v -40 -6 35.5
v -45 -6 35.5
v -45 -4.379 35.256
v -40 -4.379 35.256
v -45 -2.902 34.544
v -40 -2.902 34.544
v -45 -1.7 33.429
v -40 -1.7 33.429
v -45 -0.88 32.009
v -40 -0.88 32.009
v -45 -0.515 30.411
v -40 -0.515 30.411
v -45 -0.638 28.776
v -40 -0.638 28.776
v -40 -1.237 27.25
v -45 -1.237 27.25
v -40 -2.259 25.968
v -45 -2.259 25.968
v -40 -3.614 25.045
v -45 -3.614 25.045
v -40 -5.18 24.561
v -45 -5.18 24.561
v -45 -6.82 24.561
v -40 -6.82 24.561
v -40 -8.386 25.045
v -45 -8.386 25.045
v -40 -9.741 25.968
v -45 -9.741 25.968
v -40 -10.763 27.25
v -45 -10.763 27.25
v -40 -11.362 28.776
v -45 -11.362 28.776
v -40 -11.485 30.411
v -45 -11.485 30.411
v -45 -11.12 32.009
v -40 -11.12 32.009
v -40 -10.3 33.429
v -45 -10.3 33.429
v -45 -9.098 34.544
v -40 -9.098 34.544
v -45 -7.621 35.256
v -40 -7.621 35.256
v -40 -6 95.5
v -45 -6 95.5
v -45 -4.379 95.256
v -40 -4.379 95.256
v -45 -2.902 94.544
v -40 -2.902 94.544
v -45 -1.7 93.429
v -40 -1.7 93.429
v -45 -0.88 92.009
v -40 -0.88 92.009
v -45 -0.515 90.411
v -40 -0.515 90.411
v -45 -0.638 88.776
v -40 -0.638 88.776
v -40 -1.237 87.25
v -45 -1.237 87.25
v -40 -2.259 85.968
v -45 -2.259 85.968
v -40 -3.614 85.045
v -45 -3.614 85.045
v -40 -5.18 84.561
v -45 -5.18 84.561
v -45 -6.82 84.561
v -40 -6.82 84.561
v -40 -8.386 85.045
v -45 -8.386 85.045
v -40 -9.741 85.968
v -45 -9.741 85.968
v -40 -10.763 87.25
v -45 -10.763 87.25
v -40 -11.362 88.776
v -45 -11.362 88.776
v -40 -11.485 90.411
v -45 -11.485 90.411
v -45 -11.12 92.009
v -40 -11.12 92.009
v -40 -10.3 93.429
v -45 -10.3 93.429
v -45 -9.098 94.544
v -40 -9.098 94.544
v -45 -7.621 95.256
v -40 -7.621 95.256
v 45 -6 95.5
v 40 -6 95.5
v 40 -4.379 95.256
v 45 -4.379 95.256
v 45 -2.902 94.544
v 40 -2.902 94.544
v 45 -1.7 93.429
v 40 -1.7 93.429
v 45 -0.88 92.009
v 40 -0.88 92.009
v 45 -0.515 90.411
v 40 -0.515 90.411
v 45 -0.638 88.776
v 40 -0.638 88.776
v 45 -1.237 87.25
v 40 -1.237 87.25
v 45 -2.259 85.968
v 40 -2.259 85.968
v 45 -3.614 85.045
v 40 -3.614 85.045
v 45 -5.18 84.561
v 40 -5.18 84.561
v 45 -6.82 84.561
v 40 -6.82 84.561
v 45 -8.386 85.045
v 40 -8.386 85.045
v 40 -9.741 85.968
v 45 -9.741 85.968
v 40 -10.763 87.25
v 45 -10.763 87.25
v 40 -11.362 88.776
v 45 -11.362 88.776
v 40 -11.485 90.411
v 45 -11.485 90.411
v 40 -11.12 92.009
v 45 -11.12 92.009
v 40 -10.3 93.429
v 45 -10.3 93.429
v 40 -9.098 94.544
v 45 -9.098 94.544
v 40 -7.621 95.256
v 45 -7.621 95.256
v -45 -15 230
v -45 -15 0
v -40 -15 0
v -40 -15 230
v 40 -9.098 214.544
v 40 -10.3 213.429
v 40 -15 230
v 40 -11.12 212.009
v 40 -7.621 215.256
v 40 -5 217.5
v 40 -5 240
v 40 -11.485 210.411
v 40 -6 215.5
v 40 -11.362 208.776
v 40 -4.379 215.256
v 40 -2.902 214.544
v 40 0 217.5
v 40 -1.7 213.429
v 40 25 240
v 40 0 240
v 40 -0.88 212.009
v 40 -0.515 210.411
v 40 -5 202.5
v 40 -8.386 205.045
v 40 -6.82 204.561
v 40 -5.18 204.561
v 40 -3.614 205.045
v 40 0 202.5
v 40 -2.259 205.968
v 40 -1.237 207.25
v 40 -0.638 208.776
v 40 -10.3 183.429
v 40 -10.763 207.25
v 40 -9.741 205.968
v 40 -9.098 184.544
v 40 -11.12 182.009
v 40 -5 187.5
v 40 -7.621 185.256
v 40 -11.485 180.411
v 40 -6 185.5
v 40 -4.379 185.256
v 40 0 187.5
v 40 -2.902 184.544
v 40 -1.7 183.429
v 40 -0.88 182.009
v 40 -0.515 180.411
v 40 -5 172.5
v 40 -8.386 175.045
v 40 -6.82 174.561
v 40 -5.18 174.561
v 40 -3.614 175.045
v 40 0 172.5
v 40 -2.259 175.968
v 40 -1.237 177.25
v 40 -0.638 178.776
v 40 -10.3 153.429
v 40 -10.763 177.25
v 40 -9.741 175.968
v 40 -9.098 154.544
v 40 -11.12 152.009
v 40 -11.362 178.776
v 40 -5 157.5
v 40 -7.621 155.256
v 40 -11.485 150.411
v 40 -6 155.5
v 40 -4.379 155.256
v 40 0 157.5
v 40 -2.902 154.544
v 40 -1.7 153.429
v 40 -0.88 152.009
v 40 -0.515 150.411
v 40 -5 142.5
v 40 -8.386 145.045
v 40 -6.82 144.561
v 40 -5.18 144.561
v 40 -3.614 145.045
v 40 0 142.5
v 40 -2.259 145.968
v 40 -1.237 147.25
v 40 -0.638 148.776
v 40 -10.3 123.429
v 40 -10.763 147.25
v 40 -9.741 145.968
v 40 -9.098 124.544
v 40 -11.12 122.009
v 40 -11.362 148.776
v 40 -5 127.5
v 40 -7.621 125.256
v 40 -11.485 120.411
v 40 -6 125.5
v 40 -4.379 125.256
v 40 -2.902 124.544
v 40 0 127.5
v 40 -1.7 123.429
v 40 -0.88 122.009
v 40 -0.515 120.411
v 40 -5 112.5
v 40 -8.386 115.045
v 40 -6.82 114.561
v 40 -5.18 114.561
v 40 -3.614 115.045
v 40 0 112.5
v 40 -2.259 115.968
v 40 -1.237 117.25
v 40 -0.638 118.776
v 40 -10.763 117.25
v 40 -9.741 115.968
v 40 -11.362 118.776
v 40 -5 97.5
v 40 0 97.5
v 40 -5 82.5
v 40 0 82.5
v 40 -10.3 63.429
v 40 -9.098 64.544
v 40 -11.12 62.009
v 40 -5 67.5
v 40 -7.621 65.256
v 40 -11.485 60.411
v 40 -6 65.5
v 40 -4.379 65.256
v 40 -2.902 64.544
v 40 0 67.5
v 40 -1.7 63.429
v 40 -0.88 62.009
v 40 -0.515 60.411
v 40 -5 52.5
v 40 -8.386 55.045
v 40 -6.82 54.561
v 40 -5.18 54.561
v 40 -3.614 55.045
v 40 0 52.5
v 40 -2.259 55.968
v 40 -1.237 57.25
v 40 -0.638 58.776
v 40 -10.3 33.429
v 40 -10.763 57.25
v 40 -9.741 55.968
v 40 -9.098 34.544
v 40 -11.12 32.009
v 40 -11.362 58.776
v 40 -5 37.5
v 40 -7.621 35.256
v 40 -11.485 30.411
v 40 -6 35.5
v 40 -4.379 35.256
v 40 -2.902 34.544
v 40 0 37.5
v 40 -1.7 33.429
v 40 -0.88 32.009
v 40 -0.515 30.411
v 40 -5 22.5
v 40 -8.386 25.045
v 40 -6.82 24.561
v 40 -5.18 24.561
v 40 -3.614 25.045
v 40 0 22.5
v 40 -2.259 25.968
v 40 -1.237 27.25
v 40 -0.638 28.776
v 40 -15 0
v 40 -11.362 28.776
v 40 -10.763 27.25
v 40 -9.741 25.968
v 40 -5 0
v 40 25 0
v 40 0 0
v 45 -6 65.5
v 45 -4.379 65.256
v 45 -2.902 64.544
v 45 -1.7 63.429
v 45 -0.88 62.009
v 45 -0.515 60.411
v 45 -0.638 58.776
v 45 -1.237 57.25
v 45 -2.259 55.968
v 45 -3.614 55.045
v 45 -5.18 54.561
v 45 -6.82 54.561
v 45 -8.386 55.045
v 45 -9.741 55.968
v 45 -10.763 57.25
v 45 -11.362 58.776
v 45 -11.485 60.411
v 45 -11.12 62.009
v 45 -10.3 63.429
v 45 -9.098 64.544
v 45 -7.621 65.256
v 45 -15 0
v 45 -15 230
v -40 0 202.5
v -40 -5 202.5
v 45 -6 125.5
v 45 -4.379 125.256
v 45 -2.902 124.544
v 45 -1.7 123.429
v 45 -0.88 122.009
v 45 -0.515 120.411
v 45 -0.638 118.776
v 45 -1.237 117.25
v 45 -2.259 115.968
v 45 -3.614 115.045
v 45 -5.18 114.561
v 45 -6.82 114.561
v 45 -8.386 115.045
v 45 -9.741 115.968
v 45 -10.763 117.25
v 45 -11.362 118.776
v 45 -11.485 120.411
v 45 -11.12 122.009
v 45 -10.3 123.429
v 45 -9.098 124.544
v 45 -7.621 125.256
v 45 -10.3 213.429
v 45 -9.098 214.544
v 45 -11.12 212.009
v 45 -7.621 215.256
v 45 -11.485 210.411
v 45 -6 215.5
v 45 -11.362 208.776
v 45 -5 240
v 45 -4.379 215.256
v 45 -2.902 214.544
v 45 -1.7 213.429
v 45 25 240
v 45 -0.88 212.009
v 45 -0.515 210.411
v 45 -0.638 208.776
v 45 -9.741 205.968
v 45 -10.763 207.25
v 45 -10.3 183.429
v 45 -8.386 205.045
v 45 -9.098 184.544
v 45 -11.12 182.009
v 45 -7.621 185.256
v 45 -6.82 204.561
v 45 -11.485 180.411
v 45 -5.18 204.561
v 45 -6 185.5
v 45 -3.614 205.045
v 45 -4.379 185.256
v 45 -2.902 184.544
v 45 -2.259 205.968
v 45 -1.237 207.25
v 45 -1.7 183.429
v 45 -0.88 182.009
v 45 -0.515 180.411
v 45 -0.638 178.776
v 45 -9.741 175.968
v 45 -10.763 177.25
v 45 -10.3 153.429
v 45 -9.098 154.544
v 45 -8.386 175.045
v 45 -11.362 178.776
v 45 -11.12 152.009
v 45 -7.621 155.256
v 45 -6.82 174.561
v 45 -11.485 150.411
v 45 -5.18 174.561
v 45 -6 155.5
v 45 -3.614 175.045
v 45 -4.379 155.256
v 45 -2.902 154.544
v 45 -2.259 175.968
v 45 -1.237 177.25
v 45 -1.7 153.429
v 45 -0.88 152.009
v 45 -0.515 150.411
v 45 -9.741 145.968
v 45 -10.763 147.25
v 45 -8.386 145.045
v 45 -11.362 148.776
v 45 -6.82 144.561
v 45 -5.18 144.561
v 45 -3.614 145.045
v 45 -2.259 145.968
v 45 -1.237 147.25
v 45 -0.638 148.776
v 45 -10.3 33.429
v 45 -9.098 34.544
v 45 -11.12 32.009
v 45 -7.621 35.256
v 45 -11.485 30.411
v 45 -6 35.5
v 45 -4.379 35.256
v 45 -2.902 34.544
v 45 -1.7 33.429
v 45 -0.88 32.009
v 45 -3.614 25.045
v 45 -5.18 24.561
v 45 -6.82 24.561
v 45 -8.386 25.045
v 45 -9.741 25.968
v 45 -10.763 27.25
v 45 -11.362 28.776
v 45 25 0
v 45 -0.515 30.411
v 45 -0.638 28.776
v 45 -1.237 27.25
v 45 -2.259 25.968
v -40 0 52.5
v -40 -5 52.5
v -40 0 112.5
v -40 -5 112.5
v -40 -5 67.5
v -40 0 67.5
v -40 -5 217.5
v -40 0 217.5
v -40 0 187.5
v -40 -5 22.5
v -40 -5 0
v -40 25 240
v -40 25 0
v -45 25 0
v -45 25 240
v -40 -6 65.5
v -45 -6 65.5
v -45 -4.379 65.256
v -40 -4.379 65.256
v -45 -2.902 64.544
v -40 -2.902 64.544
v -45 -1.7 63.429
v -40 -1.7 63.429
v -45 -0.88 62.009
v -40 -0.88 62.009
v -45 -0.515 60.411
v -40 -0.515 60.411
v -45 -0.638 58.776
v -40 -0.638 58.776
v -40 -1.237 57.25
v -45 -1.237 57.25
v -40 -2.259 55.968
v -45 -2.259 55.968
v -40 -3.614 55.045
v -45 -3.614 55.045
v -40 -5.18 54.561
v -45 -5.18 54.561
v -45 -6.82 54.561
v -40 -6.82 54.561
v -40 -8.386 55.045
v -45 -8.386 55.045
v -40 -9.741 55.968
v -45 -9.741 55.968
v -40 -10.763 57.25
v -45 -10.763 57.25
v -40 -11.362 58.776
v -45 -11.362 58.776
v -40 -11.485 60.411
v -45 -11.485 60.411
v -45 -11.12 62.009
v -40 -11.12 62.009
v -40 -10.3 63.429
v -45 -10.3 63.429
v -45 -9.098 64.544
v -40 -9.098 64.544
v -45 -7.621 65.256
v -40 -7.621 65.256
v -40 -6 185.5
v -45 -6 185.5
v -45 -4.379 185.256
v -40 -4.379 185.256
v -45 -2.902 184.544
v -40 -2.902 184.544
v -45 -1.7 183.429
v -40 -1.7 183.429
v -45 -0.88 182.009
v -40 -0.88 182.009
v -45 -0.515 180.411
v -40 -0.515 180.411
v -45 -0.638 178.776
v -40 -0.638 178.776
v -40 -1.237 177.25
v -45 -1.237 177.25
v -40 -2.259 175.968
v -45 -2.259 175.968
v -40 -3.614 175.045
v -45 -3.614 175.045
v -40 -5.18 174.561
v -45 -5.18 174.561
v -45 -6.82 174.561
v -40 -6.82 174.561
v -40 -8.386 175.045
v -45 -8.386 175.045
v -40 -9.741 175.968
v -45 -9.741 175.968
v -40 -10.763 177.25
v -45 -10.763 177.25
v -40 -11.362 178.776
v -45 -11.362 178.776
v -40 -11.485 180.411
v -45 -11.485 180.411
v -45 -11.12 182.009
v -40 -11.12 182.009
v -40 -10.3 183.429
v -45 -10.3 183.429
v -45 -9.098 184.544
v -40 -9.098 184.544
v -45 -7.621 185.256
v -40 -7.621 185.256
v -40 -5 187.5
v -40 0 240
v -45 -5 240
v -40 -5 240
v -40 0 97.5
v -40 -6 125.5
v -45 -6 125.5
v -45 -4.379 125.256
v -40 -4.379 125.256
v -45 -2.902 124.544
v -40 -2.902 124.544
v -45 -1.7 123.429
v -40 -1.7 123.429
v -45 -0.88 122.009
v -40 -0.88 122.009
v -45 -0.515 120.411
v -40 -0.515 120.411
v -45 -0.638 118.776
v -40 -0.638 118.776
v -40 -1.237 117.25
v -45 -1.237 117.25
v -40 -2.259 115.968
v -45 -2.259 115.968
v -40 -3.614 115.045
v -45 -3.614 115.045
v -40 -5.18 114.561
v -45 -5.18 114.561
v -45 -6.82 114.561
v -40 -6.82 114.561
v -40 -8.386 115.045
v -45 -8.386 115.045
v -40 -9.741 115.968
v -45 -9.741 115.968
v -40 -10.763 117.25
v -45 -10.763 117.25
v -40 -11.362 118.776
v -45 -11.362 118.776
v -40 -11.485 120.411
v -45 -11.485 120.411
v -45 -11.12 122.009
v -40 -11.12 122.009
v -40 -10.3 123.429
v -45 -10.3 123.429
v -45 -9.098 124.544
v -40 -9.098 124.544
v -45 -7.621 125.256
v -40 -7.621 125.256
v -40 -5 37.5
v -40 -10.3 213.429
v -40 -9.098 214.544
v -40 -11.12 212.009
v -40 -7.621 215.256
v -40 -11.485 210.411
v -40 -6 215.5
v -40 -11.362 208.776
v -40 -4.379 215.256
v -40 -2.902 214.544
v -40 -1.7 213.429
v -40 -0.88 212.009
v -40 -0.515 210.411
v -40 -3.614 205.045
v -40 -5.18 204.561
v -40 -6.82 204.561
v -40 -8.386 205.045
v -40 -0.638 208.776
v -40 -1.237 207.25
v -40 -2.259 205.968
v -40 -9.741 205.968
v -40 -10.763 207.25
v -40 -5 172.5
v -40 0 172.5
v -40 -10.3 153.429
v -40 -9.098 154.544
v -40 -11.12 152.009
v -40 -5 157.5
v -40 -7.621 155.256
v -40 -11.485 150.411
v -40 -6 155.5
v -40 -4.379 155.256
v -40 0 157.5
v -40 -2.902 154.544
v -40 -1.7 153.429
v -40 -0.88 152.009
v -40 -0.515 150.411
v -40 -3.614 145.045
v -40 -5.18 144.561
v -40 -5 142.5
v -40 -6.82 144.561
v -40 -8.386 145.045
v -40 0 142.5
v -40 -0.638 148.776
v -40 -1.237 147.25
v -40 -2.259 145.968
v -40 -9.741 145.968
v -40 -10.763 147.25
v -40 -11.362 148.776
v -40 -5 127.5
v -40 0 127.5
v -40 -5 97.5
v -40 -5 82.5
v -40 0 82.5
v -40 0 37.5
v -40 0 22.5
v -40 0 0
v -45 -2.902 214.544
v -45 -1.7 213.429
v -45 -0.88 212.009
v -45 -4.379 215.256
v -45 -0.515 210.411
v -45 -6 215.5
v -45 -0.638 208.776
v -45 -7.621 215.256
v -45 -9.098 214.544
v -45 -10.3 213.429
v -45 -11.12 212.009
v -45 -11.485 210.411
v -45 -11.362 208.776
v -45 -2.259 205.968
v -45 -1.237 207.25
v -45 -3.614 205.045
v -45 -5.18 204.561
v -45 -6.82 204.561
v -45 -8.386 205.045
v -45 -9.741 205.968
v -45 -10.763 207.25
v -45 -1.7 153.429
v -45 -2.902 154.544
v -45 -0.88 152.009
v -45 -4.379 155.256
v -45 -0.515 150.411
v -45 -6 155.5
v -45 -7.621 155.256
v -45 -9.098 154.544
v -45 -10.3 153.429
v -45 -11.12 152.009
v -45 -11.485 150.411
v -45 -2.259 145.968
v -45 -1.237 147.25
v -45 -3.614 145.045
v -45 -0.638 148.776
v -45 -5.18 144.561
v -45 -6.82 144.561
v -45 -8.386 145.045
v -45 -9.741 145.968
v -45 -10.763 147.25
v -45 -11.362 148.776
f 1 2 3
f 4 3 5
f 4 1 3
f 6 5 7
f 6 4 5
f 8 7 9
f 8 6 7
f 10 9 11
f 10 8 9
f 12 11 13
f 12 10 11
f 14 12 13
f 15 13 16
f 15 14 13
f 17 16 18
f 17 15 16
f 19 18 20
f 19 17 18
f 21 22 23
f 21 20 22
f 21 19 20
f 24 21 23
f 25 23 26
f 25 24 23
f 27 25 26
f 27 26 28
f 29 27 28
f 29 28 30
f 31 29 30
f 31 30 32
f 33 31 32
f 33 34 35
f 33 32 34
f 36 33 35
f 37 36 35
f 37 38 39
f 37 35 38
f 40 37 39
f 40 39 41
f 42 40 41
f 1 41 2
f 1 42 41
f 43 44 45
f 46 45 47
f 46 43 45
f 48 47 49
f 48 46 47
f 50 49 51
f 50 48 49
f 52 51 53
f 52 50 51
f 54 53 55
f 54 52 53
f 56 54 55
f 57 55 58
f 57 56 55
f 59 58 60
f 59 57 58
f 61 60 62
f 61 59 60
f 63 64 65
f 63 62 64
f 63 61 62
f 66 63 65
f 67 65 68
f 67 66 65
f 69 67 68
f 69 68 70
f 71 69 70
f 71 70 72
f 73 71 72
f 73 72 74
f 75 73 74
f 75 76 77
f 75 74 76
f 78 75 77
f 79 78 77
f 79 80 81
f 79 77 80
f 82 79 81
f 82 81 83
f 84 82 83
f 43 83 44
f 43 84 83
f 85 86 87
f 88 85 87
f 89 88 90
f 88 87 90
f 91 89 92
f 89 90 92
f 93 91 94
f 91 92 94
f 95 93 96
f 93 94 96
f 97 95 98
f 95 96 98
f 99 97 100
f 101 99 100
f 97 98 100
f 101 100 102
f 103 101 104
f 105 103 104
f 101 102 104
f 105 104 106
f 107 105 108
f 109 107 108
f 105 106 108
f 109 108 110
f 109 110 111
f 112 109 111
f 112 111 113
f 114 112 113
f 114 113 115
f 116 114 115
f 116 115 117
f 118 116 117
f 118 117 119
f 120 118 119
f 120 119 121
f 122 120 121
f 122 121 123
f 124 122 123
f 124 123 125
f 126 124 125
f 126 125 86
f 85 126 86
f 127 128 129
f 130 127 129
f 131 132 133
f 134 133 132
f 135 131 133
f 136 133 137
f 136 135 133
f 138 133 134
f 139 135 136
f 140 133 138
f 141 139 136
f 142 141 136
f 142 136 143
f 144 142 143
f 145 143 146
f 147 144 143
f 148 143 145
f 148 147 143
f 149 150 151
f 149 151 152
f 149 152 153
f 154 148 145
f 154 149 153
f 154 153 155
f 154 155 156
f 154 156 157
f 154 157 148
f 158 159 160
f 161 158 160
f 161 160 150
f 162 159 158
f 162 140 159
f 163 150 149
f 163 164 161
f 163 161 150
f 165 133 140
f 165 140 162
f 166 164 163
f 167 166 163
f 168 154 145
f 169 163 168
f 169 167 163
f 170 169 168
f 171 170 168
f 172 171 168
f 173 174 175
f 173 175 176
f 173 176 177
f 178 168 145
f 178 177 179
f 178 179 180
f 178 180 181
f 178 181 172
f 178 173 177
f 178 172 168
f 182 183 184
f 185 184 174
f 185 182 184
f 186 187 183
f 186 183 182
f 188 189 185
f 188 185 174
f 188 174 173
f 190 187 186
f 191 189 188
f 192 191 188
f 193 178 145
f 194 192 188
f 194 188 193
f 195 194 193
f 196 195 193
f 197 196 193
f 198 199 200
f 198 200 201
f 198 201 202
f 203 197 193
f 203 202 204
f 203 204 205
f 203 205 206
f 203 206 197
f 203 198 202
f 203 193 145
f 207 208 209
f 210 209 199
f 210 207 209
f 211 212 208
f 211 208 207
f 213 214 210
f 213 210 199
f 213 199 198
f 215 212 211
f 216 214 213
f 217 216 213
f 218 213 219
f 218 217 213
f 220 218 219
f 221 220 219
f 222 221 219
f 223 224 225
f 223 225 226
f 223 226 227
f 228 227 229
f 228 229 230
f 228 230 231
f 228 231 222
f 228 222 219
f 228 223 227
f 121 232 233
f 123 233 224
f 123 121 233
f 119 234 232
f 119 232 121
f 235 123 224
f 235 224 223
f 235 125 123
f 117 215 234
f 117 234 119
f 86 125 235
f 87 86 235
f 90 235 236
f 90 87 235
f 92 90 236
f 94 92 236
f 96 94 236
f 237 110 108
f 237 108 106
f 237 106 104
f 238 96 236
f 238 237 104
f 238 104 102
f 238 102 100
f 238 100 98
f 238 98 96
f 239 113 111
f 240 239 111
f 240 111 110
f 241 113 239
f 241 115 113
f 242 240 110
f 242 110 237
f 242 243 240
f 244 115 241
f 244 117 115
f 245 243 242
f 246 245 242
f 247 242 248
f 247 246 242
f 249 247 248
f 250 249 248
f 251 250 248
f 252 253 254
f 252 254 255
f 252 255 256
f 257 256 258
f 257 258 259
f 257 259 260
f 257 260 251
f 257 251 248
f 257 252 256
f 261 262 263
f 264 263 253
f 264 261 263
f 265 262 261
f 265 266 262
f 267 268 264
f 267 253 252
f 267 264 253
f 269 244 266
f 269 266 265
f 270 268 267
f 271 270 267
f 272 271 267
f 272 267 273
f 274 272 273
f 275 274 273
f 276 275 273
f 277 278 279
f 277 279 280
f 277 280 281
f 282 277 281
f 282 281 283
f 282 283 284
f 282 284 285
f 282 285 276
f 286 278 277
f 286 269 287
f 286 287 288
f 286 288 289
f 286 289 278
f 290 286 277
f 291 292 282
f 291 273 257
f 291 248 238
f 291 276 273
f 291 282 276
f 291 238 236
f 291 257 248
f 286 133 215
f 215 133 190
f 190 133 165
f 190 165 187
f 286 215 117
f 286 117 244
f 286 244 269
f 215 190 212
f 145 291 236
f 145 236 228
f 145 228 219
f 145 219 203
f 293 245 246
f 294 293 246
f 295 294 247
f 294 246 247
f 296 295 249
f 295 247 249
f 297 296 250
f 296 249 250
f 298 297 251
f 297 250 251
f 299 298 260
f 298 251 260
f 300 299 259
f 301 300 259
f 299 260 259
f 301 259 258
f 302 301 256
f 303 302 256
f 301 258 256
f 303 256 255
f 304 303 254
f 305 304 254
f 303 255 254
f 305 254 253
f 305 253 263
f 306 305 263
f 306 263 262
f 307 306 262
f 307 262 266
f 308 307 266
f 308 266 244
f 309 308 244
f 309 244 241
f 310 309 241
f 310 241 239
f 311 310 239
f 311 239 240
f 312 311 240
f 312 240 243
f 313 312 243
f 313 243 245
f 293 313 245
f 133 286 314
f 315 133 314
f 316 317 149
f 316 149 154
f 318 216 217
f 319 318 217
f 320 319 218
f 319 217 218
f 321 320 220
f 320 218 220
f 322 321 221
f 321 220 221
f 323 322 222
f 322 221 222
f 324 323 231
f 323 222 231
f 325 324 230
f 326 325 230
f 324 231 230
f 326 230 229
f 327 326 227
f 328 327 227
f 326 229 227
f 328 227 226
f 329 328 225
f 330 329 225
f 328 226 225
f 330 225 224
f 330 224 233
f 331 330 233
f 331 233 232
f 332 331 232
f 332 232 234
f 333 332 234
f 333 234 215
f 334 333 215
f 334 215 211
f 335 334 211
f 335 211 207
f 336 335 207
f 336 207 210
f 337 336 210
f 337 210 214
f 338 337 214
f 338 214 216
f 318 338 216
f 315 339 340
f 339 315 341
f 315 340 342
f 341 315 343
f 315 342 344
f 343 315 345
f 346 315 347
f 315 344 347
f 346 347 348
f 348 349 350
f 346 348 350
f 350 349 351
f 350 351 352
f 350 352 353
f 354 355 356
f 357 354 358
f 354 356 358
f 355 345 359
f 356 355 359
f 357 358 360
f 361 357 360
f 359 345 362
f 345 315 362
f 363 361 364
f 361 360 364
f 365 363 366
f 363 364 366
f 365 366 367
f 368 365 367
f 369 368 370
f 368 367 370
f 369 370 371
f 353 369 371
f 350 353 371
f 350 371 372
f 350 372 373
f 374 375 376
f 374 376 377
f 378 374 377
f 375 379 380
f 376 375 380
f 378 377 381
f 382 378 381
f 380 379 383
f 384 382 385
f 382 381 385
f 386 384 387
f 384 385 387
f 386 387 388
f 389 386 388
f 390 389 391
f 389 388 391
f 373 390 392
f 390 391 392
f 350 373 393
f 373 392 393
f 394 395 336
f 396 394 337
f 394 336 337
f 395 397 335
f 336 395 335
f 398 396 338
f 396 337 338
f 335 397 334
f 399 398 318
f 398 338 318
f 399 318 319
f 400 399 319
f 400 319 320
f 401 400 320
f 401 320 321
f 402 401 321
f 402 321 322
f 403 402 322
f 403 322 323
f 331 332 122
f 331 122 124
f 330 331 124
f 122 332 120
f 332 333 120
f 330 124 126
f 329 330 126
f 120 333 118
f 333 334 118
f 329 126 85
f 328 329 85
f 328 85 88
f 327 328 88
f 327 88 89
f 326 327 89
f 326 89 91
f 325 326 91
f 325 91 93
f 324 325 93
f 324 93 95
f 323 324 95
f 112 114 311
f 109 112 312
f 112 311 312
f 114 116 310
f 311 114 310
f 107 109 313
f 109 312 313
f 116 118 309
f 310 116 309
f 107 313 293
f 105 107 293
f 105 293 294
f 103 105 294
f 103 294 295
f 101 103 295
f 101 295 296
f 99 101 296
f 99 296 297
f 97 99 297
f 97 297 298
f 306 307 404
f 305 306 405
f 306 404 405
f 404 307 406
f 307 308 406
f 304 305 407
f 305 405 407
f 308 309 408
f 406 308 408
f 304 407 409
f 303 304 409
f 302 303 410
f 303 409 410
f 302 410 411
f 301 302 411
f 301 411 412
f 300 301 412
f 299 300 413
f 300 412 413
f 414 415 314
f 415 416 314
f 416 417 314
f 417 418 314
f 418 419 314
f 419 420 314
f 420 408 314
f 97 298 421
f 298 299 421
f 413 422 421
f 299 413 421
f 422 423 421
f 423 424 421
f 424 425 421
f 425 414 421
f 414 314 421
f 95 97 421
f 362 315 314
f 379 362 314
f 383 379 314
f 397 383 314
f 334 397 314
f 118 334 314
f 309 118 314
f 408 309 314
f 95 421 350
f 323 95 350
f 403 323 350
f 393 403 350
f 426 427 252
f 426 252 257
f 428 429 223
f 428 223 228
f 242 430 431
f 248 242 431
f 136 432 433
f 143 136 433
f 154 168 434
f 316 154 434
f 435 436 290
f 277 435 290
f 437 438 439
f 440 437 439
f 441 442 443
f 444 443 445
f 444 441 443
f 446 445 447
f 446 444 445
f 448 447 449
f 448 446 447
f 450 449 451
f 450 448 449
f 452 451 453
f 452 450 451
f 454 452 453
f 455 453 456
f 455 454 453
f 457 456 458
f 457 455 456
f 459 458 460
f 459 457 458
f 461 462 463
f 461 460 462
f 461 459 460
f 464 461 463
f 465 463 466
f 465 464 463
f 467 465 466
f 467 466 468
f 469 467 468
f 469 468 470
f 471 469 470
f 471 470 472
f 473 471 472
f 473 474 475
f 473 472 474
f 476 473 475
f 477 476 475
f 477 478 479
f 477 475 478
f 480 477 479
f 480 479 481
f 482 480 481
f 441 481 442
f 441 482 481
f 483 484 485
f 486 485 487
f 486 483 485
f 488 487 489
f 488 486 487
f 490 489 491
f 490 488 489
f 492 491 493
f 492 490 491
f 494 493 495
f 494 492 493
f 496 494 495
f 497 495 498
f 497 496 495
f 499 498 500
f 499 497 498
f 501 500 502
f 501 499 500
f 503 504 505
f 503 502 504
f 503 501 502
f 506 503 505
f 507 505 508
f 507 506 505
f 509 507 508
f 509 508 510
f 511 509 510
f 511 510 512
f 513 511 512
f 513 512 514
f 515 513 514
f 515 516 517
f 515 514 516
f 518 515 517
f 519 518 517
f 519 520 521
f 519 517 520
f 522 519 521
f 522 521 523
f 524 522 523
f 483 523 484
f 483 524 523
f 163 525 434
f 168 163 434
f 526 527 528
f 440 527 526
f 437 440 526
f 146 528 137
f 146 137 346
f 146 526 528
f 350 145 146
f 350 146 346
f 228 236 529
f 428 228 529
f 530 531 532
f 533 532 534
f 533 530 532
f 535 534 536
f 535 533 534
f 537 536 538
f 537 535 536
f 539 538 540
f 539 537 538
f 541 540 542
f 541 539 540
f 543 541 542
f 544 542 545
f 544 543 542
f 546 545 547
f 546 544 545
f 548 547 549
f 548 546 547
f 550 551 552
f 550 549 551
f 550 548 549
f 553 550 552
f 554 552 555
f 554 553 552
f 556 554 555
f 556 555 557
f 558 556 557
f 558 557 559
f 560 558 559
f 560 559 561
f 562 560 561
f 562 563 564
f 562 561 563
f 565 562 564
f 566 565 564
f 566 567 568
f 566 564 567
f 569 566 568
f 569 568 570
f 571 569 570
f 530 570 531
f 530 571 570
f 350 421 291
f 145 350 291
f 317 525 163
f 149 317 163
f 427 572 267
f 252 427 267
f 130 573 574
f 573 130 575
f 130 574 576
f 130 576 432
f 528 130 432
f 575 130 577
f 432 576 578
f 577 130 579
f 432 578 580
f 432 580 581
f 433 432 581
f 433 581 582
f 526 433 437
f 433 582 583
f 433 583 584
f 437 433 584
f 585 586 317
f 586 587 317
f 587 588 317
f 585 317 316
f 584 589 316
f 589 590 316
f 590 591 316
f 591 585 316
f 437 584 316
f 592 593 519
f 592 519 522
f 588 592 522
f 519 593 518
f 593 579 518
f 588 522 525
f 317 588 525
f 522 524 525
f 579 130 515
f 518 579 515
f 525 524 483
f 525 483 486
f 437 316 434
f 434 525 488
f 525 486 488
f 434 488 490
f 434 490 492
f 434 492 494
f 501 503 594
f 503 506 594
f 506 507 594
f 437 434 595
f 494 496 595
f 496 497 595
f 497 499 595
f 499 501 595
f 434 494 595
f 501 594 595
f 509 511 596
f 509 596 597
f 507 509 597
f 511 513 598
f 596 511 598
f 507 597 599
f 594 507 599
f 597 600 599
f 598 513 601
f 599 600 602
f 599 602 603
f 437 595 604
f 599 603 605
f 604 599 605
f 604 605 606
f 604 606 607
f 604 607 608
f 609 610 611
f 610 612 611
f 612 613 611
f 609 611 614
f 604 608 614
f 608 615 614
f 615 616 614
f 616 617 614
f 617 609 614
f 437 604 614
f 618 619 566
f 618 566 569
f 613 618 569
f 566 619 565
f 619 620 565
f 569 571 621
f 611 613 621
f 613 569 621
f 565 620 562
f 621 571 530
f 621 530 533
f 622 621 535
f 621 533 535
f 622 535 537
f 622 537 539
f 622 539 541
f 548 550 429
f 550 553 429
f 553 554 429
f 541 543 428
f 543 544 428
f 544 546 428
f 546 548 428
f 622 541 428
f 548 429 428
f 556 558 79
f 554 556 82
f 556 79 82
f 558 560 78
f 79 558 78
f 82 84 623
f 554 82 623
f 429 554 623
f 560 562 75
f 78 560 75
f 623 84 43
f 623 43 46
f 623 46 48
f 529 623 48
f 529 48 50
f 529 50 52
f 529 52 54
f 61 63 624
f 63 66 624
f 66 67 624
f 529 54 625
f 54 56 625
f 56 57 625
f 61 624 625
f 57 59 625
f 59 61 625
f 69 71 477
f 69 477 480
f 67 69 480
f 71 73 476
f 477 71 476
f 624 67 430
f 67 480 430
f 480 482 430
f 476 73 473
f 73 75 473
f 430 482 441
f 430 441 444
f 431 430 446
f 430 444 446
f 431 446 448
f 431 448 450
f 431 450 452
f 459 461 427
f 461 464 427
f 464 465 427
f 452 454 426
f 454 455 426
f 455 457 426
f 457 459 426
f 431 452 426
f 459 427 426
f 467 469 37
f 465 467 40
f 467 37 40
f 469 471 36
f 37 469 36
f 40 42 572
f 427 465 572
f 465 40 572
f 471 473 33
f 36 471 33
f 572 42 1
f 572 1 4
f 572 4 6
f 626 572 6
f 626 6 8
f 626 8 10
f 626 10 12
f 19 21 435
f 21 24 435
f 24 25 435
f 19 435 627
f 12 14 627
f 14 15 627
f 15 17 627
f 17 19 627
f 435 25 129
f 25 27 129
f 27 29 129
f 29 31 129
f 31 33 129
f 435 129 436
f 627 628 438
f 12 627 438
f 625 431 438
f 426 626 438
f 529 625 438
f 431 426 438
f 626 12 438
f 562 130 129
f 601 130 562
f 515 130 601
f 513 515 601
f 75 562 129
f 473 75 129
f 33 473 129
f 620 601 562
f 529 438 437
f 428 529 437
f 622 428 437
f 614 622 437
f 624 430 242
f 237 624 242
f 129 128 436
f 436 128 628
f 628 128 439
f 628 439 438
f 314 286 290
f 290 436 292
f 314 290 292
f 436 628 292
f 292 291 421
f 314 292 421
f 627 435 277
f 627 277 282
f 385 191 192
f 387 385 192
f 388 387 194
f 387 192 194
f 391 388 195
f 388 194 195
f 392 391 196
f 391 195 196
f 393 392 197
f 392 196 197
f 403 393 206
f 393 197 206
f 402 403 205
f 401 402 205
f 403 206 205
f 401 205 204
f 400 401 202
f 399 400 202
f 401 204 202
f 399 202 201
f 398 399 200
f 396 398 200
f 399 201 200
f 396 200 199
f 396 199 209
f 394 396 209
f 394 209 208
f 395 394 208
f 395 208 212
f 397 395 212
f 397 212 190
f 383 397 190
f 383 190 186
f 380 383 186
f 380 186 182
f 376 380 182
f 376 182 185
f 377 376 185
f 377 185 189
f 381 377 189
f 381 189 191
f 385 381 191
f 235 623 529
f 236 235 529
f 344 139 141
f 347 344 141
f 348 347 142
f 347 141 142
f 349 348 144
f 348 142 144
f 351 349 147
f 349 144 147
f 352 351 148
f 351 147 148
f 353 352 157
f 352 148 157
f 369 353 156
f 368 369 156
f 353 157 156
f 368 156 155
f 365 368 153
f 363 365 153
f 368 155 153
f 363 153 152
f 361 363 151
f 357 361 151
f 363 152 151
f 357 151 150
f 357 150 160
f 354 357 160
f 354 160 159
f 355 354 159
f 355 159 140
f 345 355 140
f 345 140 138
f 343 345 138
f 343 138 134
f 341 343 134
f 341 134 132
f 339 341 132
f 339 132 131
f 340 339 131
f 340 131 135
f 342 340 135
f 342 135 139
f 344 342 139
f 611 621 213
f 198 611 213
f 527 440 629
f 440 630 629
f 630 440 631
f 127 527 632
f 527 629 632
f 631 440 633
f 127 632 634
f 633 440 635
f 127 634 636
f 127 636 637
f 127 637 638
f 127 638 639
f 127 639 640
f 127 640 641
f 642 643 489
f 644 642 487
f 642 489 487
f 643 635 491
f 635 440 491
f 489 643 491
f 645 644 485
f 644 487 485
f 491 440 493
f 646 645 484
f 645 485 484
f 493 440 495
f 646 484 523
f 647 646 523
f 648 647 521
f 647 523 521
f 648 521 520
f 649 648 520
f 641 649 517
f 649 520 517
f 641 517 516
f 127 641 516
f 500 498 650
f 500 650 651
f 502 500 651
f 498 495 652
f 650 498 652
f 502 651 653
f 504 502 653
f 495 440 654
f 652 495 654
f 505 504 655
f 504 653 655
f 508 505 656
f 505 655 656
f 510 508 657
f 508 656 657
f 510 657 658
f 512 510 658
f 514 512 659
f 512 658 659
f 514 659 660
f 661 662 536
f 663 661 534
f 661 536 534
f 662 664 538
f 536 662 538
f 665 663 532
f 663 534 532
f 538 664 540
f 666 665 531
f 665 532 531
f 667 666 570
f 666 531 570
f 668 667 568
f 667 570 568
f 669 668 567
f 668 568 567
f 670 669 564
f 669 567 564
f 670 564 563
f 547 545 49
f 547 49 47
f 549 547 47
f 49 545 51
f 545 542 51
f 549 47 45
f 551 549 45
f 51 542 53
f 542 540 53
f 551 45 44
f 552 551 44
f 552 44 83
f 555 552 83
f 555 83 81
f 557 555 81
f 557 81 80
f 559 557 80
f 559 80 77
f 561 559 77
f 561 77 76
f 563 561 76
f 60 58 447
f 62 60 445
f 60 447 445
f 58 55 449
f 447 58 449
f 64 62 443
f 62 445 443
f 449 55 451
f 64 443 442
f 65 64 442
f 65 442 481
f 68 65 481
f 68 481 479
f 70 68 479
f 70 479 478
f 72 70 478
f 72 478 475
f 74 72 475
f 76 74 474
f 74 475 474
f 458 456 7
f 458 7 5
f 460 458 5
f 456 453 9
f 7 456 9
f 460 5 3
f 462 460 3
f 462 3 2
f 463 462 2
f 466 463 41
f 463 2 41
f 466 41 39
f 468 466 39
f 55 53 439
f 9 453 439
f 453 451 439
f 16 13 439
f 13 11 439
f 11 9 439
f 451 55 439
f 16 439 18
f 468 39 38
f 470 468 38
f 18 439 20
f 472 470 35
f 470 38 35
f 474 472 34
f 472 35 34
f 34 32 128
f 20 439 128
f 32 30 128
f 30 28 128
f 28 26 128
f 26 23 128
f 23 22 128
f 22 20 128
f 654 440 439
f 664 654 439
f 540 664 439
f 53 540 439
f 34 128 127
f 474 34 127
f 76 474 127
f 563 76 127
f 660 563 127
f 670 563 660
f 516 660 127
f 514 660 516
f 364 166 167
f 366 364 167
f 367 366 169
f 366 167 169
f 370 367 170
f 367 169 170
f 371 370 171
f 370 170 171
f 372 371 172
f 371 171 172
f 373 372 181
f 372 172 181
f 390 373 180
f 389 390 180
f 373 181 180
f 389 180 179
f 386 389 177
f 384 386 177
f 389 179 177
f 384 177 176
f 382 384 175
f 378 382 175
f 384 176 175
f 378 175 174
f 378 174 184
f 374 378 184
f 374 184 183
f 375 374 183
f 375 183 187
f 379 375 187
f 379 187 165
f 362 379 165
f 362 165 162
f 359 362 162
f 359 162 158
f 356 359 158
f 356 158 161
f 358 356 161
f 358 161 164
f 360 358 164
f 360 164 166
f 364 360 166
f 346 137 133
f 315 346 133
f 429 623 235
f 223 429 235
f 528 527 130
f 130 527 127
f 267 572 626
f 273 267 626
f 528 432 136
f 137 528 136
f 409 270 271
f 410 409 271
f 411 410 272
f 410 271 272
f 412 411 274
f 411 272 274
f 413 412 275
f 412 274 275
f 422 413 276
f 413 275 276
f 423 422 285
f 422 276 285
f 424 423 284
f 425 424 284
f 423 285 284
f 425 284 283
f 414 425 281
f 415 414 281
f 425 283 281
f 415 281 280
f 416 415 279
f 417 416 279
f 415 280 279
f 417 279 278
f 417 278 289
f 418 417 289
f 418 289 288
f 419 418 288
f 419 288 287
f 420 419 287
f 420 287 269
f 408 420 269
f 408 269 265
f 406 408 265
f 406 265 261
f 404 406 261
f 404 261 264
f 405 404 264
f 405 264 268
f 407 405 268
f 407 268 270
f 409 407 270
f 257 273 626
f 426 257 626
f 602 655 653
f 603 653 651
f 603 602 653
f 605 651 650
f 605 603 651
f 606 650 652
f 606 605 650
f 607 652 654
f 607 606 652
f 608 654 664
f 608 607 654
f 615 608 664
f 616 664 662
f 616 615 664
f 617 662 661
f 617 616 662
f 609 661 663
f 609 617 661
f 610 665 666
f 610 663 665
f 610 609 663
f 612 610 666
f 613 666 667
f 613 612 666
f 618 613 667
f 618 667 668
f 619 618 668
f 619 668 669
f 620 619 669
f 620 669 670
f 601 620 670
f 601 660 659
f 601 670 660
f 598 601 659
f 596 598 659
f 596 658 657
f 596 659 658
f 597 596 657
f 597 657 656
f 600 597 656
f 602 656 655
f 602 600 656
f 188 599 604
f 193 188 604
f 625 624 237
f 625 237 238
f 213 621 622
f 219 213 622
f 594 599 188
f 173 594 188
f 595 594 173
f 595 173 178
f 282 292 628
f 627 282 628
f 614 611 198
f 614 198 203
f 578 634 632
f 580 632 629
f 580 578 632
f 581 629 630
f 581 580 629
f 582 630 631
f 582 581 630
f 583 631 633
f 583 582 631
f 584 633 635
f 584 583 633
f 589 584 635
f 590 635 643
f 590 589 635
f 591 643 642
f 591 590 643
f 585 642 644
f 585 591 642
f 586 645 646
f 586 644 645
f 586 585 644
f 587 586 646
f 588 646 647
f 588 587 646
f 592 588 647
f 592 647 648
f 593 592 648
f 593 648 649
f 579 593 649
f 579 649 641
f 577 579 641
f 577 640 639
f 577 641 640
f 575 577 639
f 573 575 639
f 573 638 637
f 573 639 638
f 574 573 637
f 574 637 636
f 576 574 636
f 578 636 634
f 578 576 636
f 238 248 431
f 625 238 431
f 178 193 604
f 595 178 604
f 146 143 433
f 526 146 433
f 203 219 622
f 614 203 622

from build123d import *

# Parameters (mm, degrees)
SKETCH_1_W          = 5
SKETCH_1_H          = 10
EXTRUDE_1_DEPTH     = 240
SKETCH_3_R          = 5.5
CUT_EXTRUDE_1_DEPTH = 90
SKETCH_5_W          = 15
SKETCH_5_H          = 15
CUT_EXTRUDE_2_DEPTH = 80


with BuildPart() as part:
    # 草图1 → 凸台-拉伸1 (new body)
    with BuildSketch(Plane.XY):
        Polygon((0, -5), (0, 0), (-40, 0), (-40, 25), (-45, 25), (-45, -5), (-40, -5), align=None)
        Polygon((40, 25), (40, 0), (0, 0), (0, -5), (40, -5), (45, -5), (45, 25), align=None)
        with Locations((-42.5, -10)):
            Rectangle(SKETCH_1_W, SKETCH_1_H)
        with Locations((42.5, -10)):
            Rectangle(SKETCH_1_W, SKETCH_1_H)
    extrude(amount=EXTRUDE_1_DEPTH)

    # 草图3 → 切除-拉伸1 (cut, symmetric)
    with BuildSketch(Plane.ZY.offset(-40)):
        with Locations((30, -6)):
            Circle(SKETCH_3_R)
        with Locations((60, -6)):
            Circle(SKETCH_3_R)
        with Locations((90, -6)):
            Circle(SKETCH_3_R)
        with Locations((120, -6)):
            Circle(SKETCH_3_R)
        with Locations((150, -6)):
            Circle(SKETCH_3_R)
        with Locations((180, -6)):
            Circle(SKETCH_3_R)
        with Locations((210, -6)):
            Circle(SKETCH_3_R)
        Polygon((240, -5), (230, -15), (240, -15), align=None)
    extrude(amount=CUT_EXTRUDE_1_DEPTH, both=True, mode=Mode.SUBTRACT)

    # 草图5 → 切除-拉伸2 (cut)
    with BuildSketch(Plane(origin=(-40, 0, 0), x_dir=(0, 0, -1), z_dir=(1, 0, 0))):
        with Locations((-210, -5)):
            Rectangle(SKETCH_5_W, SKETCH_5_H)
        with Locations((-180, -5)):
            Rectangle(SKETCH_5_W, SKETCH_5_H)
        with Locations((-150, -5)):
            Rectangle(SKETCH_5_W, SKETCH_5_H)
        with Locations((-120, -5)):
            Rectangle(SKETCH_5_W, SKETCH_5_H)
        with Locations((-90, -5)):
            Rectangle(SKETCH_5_W, SKETCH_5_H)
        with Locations((-60, -5)):
            Rectangle(SKETCH_5_W, SKETCH_5_H)
        with Locations((-30, -5)):
            Rectangle(SKETCH_5_W, SKETCH_5_H)
    extrude(amount=CUT_EXTRUDE_2_DEPTH, mode=Mode.SUBTRACT)


solid = part.part
